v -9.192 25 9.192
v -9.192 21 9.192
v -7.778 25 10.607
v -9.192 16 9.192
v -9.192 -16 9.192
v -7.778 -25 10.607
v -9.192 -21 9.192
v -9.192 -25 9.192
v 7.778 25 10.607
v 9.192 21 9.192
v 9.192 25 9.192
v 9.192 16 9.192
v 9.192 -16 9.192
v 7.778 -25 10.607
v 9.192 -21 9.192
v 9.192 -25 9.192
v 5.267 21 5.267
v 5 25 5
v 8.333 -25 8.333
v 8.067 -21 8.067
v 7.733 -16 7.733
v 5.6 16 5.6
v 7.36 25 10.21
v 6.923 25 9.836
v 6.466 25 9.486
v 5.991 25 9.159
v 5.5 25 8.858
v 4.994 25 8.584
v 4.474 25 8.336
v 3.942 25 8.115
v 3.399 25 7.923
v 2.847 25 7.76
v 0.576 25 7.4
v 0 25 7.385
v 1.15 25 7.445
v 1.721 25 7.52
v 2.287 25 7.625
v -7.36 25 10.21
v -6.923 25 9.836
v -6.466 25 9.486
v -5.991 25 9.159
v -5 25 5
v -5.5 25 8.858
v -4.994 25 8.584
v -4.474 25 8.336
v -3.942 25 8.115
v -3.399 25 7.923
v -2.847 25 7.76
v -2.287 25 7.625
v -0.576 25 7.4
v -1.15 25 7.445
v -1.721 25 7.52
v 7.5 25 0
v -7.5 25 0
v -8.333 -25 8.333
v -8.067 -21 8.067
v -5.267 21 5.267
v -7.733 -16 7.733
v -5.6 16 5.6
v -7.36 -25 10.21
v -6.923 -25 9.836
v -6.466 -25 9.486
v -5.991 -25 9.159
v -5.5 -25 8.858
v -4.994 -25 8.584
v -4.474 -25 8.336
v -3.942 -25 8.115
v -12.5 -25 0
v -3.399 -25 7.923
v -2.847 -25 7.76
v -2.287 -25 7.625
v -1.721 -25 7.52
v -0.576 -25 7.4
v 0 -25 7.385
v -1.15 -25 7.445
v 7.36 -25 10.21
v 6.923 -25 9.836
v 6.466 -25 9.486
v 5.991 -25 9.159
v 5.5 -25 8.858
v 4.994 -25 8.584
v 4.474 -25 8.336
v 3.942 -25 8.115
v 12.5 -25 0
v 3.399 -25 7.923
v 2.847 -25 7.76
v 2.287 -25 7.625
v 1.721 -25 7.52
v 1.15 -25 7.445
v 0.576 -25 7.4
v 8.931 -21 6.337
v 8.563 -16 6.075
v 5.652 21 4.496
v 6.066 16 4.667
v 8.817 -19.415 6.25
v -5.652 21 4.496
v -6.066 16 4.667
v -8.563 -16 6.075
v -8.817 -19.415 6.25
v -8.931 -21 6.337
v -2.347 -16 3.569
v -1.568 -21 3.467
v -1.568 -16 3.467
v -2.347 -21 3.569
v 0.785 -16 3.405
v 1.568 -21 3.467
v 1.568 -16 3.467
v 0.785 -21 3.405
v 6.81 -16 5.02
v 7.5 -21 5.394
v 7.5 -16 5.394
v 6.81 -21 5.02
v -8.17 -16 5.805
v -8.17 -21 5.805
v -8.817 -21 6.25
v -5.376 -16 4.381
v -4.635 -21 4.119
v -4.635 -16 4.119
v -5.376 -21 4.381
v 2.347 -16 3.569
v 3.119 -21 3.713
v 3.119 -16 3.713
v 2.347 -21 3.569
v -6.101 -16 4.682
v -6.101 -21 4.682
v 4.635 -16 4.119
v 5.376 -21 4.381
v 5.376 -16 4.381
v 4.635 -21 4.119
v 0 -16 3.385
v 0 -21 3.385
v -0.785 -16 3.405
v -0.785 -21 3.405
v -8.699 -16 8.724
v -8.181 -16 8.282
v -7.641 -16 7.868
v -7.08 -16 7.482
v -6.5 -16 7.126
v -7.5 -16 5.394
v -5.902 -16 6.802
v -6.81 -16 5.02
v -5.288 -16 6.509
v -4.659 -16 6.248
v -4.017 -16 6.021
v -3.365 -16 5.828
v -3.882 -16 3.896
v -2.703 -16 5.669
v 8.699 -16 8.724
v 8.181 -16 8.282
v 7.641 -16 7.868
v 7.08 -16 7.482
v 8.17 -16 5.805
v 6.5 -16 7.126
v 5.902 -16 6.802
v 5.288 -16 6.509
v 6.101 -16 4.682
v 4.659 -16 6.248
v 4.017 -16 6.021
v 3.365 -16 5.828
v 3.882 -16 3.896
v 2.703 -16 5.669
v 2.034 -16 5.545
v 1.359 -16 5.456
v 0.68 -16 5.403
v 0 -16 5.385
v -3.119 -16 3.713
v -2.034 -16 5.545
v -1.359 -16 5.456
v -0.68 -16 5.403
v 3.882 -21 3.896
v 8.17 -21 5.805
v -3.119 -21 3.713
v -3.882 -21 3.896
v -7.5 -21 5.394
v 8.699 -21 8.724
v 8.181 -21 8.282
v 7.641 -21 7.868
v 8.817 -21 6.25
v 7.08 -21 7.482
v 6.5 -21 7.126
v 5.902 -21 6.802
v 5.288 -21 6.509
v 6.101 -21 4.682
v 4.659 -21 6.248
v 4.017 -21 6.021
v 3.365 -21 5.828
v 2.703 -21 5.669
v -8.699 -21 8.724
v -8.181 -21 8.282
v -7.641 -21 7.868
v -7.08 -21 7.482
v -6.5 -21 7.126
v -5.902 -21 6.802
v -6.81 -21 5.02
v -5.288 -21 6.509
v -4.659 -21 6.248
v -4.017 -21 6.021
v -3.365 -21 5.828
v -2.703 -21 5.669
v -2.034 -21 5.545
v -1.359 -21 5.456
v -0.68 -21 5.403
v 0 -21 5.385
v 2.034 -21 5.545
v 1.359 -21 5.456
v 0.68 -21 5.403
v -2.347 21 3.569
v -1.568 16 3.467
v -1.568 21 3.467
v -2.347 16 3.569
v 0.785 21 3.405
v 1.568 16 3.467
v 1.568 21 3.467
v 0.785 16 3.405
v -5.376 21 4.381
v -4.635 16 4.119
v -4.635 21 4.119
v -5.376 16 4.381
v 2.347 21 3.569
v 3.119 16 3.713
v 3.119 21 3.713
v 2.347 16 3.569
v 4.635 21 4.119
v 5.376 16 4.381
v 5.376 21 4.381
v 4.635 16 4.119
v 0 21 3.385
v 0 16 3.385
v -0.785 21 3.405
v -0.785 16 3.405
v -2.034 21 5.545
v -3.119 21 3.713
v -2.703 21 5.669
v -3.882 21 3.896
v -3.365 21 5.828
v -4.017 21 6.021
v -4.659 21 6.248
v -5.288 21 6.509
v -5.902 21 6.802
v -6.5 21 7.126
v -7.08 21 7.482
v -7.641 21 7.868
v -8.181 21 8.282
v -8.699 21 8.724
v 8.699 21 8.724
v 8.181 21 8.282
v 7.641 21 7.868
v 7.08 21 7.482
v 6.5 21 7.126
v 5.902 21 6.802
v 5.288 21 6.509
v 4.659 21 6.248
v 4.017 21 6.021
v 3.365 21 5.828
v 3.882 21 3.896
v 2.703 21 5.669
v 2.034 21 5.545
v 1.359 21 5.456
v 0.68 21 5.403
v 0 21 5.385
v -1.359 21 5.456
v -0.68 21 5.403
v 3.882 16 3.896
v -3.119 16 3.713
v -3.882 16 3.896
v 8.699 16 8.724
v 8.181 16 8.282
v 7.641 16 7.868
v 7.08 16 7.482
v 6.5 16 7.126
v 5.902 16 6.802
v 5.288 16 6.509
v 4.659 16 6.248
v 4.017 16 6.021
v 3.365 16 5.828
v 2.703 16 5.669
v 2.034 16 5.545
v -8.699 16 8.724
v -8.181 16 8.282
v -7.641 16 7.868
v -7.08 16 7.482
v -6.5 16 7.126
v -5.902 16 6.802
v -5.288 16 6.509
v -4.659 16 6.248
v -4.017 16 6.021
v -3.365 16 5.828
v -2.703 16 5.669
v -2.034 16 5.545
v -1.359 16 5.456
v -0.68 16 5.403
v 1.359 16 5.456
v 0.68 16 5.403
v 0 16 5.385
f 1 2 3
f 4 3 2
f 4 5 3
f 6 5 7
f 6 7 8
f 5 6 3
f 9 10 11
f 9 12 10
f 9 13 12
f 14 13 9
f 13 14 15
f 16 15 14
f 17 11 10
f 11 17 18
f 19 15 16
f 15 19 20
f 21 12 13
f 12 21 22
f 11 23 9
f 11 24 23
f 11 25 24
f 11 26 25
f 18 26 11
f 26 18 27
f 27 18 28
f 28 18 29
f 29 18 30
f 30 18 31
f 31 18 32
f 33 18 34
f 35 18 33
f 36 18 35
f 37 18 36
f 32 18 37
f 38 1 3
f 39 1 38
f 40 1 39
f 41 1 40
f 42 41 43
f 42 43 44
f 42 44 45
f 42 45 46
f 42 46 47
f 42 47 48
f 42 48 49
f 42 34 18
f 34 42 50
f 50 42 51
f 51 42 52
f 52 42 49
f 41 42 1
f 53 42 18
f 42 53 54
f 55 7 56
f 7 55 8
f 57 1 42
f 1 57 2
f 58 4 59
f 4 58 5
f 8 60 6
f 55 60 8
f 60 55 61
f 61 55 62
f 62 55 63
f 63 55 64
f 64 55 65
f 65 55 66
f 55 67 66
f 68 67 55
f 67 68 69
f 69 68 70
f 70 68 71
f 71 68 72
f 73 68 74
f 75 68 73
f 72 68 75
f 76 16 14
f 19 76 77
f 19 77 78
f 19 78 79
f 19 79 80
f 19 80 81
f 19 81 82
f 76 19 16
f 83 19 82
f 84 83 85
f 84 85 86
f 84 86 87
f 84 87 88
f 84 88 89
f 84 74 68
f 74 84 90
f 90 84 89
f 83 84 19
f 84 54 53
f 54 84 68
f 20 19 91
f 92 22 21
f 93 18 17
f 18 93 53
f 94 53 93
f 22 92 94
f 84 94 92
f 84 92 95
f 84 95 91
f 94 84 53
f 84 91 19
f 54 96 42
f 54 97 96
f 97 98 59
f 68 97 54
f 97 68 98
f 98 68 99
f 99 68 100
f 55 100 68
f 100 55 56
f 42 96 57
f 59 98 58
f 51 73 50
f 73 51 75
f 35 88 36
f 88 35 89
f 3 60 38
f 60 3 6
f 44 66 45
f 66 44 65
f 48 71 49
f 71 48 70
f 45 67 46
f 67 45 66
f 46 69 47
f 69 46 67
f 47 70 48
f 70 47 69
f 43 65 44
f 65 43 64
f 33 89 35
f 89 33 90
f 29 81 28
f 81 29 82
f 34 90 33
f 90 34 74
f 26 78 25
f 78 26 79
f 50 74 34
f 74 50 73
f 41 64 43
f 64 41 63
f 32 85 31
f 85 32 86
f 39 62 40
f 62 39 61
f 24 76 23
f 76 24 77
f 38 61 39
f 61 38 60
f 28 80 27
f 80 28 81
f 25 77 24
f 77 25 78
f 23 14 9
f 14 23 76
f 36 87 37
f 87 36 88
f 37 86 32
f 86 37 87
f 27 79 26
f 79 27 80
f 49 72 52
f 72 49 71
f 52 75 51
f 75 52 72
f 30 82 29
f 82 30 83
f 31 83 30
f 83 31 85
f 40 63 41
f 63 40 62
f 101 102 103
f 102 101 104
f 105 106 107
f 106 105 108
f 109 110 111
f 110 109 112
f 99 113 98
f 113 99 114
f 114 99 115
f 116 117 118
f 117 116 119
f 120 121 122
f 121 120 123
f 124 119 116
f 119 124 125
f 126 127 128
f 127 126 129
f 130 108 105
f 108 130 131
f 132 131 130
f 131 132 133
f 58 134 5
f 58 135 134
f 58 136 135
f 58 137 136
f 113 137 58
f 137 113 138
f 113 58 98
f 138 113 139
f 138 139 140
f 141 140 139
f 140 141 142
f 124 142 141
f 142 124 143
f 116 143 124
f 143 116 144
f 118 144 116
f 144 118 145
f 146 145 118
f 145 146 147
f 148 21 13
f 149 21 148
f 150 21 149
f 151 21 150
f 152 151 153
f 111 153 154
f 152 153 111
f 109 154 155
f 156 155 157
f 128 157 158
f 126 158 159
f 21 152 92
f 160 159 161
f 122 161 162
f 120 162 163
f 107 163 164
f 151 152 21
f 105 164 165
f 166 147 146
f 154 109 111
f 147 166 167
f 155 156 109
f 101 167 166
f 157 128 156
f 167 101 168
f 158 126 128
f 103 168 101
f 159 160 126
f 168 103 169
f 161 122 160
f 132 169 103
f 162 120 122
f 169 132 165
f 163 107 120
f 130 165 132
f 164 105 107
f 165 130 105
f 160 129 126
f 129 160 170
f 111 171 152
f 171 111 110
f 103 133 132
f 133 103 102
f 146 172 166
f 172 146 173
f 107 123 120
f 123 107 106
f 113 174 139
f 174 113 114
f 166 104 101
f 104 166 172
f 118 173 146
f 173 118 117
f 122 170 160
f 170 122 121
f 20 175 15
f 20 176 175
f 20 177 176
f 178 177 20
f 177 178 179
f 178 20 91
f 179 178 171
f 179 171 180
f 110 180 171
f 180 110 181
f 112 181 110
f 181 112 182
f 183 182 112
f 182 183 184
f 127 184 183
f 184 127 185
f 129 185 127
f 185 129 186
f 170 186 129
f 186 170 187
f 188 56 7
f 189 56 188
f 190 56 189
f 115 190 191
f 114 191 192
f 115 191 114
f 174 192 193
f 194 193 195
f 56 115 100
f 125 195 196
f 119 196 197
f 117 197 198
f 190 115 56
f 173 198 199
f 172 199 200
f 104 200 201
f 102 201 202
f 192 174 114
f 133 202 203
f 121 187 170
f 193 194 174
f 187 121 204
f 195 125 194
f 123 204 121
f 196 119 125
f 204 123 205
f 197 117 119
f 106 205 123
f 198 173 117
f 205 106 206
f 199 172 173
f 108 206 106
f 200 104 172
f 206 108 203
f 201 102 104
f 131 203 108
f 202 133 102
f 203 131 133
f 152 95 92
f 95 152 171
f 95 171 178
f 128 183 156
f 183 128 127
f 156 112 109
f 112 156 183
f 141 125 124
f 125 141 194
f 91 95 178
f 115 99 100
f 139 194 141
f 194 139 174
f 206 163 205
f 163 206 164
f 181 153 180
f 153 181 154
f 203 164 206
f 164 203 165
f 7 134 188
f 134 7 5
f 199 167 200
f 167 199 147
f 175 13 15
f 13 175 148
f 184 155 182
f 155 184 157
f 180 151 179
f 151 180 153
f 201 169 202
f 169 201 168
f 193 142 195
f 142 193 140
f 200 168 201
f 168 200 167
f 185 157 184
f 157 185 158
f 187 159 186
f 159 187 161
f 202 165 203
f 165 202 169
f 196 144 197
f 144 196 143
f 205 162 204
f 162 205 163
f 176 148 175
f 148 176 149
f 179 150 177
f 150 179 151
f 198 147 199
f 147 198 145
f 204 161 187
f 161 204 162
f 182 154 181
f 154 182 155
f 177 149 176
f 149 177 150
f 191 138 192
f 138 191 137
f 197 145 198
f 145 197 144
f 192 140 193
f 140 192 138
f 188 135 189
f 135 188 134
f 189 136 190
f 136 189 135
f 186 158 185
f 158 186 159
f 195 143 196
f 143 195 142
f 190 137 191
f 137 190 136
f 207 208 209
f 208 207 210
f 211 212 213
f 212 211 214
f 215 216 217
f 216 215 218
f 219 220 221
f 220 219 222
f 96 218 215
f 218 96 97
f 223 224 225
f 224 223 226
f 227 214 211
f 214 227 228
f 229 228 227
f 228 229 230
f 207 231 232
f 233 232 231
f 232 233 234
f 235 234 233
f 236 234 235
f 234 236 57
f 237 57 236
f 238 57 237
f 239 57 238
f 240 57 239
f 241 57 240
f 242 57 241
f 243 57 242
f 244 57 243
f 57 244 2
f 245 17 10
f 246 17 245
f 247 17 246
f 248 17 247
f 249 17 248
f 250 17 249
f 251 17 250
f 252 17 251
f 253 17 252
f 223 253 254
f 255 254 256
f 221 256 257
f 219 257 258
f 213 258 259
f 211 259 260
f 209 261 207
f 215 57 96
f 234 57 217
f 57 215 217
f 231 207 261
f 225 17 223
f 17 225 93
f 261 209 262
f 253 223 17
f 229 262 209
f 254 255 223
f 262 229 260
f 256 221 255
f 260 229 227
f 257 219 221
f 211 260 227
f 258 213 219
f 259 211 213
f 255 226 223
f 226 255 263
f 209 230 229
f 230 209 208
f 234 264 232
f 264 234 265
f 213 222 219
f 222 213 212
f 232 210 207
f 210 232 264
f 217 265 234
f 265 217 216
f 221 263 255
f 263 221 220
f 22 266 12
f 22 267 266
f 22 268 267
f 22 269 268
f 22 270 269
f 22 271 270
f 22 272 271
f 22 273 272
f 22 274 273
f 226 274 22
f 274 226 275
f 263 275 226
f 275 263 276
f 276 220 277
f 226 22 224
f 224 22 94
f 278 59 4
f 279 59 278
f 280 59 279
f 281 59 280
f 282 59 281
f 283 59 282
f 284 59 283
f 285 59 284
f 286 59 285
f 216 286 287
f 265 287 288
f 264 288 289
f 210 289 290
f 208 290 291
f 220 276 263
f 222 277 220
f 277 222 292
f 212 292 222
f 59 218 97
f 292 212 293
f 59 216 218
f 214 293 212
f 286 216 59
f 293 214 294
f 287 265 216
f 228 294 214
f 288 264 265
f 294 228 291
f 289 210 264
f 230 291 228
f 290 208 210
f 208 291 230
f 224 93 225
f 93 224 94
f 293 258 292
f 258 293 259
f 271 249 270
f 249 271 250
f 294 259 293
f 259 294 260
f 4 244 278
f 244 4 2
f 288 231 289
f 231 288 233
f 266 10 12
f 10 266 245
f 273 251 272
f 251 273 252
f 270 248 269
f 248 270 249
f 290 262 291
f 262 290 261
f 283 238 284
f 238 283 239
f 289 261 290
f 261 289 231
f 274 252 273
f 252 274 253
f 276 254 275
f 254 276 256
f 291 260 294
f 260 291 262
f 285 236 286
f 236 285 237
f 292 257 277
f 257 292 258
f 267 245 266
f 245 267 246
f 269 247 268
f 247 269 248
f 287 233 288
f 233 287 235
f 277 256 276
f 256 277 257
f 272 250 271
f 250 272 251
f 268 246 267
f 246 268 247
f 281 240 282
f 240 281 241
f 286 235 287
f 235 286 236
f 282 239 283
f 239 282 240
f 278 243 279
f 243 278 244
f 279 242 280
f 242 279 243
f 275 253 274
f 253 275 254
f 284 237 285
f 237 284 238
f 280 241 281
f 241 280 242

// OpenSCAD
// file: parts/slide.scad
module slide(l, h, w1, w2){
    translate([-w1/2, -l/2, -h/2])
    polyhedron(
        points=[
            // lowest layer
            [0, 0, 0],
            [w1, 0, 0],
            [w2-((w2-w1)/2), l, 0],
            [-((w2-w1)/2), l, 0],

            // top layer
            [h/2, 0, h],
            [w1-h/2, 0, h],
            [w2-((w2-w1)/2)-h/2, l, h],
            [-((w2-w1)/2)+h/2, l, h],
            [0, h/2, h],
            [0, w1-h/2, h],
            [l, w2-((w2-w1)/2), h],
            [l, -((w2-w1)/2)+h/2, h]
        ],
        faces=[
            // bottom
            [0, 1, 2, 3],

            // sides beginning with front
            [0, 4, 5, 1],
            [1, 5, 6, 2],
            [3, 2, 6, 7],
            [0, 3, 7, 4],

            // top
            [4, 7, 6, 5]
        ]
    );
}

slide(60, 5, 20, 24);
// main file
use <parts/slide.scad>;

radius=11;
length=50;

thickness=2;

stripe_width=5;
stripe_height=2;
stripe_edge_distance=4;

fn=120;

holder_hypotenuse=sqrt(2*pow(radius+thickness, 2));

difference() {
  difference() {
    union() {
      rotate([0, -45, 0])
      translate([0, -length/2, 0])
        cube([radius+thickness, length, radius+thickness]);

      translate([0, 0, holder_hypotenuse/4])
        slide(l = length, h = holder_hypotenuse/2, w1 = 25, w2 = 15);
    }

    translate([0, length/2+10, holder_hypotenuse])
    rotate([90, 0, 0])
      cylinder(h = length+20, r = radius, $fn = fn);
  }

  for(i=[-1, 1])
    translate([0, stripe_width/2+i*(length/2-stripe_width/2-stripe_edge_distance), sqrt(2*pow(radius+thickness, 2))])
    rotate([90, 0, 0])
      difference() {
        cylinder(h = stripe_width, r = radius+thickness+stripe_height, $fn = fn);
        translate([0, 0, -1])
        cylinder(h = stripe_width+2, r = radius+thickness, $fn = fn);
      }
}
